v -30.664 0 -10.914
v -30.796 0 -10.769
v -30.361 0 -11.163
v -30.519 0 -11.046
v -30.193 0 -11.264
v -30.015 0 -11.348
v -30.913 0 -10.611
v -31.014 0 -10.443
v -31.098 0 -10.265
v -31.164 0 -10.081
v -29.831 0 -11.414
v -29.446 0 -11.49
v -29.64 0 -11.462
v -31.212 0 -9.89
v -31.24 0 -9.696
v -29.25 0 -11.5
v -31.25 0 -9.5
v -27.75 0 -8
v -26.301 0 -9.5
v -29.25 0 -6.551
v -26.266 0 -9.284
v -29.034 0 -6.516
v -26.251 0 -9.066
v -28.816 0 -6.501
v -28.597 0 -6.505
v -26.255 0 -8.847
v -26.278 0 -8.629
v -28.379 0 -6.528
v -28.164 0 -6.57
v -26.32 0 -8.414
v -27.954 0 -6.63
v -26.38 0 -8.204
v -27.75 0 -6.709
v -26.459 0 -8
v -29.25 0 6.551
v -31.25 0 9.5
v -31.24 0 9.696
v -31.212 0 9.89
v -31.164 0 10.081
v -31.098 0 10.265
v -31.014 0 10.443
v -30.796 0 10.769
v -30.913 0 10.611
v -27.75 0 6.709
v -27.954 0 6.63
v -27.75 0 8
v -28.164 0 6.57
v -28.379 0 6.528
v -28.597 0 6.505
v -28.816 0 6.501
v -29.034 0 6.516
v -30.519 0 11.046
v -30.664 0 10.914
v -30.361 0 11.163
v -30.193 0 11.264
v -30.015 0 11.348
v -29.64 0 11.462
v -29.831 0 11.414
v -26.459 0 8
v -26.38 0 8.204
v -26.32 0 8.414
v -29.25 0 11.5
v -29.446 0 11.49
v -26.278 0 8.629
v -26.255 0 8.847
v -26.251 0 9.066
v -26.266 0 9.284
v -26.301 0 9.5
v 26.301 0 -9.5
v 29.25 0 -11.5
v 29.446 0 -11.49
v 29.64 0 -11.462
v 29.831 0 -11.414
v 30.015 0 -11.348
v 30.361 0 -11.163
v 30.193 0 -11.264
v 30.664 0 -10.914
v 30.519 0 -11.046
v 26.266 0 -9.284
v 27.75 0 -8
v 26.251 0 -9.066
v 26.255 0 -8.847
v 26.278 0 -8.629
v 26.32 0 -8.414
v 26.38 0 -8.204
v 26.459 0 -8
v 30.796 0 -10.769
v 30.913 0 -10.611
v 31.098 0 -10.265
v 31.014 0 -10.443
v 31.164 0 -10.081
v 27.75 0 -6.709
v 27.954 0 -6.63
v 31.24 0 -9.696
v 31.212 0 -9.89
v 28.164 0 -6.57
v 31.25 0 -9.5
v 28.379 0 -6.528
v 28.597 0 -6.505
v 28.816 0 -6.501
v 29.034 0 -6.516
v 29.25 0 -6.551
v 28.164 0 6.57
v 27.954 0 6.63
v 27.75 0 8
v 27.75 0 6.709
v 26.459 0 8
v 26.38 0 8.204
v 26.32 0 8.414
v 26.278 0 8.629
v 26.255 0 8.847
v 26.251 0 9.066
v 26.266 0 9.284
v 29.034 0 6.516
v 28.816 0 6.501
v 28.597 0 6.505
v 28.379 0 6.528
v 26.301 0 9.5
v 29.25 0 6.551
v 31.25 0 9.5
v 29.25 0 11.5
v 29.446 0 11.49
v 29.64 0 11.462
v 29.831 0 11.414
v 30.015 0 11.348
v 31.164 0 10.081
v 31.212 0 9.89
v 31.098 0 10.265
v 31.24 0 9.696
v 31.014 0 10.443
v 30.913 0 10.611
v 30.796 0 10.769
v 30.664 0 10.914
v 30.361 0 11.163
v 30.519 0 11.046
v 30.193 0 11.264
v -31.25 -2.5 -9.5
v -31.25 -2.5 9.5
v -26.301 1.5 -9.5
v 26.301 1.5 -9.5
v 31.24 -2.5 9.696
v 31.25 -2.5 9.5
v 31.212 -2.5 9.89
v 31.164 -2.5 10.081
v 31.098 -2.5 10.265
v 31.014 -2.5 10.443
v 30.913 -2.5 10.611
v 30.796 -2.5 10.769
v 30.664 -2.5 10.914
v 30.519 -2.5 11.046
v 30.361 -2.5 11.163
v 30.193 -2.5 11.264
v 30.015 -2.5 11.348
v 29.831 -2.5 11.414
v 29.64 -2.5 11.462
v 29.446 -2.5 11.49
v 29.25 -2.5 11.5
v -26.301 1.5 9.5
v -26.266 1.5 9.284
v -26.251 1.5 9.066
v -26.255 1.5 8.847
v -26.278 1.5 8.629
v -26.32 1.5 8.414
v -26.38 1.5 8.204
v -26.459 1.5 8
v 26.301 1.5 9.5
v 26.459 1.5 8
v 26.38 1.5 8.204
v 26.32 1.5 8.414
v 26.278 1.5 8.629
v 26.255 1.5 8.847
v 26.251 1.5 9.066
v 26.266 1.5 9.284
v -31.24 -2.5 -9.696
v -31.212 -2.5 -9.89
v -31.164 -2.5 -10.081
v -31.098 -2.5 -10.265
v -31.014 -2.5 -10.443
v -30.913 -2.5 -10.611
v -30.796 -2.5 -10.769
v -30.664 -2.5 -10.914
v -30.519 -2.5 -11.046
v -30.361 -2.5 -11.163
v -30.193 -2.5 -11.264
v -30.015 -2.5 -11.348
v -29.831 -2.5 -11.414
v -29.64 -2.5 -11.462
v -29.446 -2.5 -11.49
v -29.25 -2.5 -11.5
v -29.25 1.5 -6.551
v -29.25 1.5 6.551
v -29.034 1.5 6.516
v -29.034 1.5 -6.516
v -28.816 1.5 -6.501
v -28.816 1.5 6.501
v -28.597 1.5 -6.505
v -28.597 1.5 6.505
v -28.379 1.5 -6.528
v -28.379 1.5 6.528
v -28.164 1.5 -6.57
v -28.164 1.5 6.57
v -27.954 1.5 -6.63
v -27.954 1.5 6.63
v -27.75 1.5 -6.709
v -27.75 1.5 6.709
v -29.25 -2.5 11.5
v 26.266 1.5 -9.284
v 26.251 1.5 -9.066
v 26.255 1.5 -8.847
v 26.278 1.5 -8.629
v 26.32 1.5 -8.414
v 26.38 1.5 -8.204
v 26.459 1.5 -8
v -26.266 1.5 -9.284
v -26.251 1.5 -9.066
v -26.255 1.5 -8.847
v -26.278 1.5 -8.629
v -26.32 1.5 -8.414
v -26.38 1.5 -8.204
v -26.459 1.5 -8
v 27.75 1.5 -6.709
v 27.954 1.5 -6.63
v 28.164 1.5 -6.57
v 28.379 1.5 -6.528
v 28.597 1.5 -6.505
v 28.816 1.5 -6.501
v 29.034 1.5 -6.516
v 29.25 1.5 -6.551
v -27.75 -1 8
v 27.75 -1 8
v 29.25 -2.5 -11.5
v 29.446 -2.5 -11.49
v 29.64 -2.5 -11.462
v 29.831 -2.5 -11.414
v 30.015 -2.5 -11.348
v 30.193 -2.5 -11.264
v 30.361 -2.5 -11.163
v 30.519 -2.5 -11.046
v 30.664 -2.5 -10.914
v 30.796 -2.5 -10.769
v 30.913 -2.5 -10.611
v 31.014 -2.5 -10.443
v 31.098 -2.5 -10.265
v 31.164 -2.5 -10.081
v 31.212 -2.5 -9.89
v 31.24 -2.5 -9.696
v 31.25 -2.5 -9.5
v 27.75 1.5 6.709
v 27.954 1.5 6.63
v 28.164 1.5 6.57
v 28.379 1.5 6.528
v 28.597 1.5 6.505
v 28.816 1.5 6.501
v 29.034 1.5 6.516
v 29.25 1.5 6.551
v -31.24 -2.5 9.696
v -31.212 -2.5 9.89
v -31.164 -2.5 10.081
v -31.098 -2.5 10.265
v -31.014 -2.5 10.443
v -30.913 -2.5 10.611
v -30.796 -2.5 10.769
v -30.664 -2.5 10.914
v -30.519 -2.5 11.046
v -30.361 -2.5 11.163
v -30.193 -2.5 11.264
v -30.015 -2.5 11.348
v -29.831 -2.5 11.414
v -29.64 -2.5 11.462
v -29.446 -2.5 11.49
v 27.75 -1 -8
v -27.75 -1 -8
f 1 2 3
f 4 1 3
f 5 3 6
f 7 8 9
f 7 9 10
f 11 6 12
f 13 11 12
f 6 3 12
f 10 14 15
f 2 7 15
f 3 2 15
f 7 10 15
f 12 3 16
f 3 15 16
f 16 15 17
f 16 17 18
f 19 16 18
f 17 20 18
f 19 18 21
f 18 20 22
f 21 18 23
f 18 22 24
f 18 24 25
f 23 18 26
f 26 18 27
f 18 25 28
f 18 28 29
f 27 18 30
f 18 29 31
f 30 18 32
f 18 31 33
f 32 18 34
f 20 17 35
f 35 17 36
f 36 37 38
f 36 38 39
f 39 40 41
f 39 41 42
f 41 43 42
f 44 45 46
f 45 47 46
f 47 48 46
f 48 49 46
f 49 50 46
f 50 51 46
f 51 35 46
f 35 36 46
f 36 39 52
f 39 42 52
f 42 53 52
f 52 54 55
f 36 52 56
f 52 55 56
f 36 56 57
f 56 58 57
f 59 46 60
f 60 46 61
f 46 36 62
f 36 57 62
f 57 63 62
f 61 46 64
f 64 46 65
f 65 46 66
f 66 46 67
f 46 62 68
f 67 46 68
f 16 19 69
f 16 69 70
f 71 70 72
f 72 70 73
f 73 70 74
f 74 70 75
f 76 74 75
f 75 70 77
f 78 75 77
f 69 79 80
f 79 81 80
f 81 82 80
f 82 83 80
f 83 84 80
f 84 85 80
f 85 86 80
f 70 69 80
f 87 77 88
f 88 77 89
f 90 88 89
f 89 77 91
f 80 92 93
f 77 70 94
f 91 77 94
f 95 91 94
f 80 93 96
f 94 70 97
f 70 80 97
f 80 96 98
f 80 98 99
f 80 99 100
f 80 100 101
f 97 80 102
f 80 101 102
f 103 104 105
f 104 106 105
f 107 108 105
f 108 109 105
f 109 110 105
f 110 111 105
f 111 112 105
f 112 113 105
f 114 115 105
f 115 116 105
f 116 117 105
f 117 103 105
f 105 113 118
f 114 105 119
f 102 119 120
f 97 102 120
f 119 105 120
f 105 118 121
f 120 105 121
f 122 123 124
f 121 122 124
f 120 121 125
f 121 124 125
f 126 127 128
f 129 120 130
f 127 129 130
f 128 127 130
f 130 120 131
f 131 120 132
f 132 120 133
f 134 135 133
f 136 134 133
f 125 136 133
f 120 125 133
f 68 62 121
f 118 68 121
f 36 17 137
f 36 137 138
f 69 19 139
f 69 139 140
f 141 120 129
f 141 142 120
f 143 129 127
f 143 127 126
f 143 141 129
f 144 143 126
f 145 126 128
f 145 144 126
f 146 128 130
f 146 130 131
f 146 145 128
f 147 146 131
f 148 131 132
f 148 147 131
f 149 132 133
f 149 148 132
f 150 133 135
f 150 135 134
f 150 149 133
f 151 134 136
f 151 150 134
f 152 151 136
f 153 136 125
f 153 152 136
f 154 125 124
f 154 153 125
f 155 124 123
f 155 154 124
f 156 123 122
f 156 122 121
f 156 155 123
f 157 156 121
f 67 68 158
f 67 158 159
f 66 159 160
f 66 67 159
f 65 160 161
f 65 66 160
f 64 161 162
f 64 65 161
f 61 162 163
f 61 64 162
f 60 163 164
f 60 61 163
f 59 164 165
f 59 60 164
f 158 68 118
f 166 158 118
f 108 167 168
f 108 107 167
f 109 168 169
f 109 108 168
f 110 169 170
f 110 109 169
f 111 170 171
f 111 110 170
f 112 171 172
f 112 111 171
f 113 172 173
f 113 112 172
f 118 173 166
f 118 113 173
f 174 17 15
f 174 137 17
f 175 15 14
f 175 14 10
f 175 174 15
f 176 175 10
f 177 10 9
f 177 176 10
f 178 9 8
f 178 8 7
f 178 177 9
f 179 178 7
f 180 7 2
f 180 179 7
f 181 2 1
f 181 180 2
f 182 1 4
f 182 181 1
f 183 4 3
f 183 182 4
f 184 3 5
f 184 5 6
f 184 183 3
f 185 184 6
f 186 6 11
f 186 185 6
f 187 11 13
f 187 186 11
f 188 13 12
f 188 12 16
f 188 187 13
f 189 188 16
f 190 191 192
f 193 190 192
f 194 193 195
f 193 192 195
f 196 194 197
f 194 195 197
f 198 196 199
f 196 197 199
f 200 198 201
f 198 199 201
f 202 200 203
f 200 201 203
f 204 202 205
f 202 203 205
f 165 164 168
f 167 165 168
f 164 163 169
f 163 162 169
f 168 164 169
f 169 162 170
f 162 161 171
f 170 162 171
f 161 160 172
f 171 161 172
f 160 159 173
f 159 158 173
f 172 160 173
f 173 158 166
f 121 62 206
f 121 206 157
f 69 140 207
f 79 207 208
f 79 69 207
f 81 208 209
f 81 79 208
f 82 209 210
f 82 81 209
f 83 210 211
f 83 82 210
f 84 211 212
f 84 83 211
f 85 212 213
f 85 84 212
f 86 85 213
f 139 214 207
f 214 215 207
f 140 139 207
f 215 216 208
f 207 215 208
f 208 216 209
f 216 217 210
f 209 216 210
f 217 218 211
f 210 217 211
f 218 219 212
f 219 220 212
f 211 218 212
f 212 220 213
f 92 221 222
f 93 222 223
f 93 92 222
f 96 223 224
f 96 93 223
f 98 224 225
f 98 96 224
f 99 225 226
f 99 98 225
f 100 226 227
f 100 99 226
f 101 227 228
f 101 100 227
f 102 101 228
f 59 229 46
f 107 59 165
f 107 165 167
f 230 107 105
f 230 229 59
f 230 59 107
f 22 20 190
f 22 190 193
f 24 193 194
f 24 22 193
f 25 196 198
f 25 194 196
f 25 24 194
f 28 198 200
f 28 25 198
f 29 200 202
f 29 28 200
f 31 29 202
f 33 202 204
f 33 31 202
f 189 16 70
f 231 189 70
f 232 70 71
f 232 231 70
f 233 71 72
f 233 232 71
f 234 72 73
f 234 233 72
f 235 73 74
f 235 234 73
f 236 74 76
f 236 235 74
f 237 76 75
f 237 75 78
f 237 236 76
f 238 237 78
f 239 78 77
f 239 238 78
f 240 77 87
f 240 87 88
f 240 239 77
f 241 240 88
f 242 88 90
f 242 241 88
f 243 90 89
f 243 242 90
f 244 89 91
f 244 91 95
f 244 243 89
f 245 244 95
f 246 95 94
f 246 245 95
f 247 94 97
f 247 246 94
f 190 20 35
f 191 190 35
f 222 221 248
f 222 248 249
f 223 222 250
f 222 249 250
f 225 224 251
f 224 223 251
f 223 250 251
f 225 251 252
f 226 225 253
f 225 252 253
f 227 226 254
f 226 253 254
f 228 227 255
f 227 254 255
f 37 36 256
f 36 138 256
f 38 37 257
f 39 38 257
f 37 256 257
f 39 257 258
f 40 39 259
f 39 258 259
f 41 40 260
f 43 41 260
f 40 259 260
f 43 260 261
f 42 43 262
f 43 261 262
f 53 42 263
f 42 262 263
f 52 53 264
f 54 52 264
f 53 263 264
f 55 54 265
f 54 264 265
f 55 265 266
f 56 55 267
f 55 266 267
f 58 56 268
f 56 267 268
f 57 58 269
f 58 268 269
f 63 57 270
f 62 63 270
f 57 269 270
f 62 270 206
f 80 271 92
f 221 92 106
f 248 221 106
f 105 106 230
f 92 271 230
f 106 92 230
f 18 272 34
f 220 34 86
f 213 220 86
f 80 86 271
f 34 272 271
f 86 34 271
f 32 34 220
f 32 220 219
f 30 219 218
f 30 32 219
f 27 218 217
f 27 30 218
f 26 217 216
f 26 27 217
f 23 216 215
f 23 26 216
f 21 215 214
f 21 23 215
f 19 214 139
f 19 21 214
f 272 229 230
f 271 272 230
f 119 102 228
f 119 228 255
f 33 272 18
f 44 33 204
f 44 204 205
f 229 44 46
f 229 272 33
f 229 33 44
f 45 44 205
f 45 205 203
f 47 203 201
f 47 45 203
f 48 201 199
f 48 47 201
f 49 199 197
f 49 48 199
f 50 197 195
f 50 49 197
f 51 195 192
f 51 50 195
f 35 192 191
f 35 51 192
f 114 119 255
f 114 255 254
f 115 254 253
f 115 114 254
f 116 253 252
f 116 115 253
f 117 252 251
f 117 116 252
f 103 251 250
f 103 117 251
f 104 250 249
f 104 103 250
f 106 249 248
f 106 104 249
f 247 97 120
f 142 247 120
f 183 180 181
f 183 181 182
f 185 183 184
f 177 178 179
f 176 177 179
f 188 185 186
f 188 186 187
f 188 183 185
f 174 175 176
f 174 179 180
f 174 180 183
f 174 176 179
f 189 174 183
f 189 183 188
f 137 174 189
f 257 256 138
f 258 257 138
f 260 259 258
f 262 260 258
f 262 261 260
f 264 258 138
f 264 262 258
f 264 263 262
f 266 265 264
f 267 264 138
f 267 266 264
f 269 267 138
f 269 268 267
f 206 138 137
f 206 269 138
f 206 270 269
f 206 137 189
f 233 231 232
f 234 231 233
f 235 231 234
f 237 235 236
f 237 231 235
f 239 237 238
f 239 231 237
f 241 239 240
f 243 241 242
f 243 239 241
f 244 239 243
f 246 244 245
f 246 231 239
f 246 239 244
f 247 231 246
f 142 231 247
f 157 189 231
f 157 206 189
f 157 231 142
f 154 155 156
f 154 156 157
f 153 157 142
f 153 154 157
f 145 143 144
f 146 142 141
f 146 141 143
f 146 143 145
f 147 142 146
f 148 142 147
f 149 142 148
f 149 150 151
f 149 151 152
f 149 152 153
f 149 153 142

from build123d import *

# Parameters (mm, degrees)
F0_W     = 62.5
F0_H     = 23
F1_DEPTH = 2.5
F2_T     = -2
F3_R     = 2
F4_DEPTH = 2
F5_T     = -1.5
F6_R     = 2.5
F7_DEPTH = 2


# Not quite as in the source:
# - a feature names something its author has since deleted; it is built from what else it names


with BuildPart() as f1:
    # F0 (on Front) → F1 (new body)
    with BuildSketch(Plane.XZ):
        Rectangle(F0_W, F0_H)
    extrude(amount=F1_DEPTH)

    # F2
    f2_openings = [f1.faces().sort_by_distance(p)[0] for p in [
        (0, 0, 0),
    ]]
    offset(amount=F2_T, openings=f2_openings)

    # F3
    f3_edges = [f1.edges().sort_by_distance(p)[0] for p in [
        (-31.25, -1.25, 11.5),
        (-31.25, -1.25, -11.5),
        (31.25, -1.25, 11.5),
        (31.25, -1.25, -11.5),
    ]]
    fillet(f3_edges, radius=F3_R)

    # F4 (add): a face of the model
    f4_faces = [f1.faces().sort_by_distance(p)[0] for p in [
        (0, -0.5, 0),
    ]]
    extrude(f4_faces, amount=F4_DEPTH)

    # F5
    f5_openings = [f1.faces().sort_by_distance(p)[0] for p in [
        (0, 1.5, 0),
    ]]
    offset(amount=F5_T, openings=f5_openings, kind=Kind.INTERSECTION)

    # F6 (on face) → F7 (cut)
    with BuildSketch(Plane(origin=(0, 0, 0), x_dir=(-1, 0, 0), z_dir=(0, 1, 0))):
        with Locations((-28.75, 9)):
            Circle(F6_R)
        with Locations((28.75, 9)):
            Circle(F6_R)
        with Locations((28.75, -9)):
            Circle(F6_R)
        with Locations((-28.75, -9)):
            Circle(F6_R)
    extrude(amount=F7_DEPTH, mode=Mode.SUBTRACT)


solid = f1.part
